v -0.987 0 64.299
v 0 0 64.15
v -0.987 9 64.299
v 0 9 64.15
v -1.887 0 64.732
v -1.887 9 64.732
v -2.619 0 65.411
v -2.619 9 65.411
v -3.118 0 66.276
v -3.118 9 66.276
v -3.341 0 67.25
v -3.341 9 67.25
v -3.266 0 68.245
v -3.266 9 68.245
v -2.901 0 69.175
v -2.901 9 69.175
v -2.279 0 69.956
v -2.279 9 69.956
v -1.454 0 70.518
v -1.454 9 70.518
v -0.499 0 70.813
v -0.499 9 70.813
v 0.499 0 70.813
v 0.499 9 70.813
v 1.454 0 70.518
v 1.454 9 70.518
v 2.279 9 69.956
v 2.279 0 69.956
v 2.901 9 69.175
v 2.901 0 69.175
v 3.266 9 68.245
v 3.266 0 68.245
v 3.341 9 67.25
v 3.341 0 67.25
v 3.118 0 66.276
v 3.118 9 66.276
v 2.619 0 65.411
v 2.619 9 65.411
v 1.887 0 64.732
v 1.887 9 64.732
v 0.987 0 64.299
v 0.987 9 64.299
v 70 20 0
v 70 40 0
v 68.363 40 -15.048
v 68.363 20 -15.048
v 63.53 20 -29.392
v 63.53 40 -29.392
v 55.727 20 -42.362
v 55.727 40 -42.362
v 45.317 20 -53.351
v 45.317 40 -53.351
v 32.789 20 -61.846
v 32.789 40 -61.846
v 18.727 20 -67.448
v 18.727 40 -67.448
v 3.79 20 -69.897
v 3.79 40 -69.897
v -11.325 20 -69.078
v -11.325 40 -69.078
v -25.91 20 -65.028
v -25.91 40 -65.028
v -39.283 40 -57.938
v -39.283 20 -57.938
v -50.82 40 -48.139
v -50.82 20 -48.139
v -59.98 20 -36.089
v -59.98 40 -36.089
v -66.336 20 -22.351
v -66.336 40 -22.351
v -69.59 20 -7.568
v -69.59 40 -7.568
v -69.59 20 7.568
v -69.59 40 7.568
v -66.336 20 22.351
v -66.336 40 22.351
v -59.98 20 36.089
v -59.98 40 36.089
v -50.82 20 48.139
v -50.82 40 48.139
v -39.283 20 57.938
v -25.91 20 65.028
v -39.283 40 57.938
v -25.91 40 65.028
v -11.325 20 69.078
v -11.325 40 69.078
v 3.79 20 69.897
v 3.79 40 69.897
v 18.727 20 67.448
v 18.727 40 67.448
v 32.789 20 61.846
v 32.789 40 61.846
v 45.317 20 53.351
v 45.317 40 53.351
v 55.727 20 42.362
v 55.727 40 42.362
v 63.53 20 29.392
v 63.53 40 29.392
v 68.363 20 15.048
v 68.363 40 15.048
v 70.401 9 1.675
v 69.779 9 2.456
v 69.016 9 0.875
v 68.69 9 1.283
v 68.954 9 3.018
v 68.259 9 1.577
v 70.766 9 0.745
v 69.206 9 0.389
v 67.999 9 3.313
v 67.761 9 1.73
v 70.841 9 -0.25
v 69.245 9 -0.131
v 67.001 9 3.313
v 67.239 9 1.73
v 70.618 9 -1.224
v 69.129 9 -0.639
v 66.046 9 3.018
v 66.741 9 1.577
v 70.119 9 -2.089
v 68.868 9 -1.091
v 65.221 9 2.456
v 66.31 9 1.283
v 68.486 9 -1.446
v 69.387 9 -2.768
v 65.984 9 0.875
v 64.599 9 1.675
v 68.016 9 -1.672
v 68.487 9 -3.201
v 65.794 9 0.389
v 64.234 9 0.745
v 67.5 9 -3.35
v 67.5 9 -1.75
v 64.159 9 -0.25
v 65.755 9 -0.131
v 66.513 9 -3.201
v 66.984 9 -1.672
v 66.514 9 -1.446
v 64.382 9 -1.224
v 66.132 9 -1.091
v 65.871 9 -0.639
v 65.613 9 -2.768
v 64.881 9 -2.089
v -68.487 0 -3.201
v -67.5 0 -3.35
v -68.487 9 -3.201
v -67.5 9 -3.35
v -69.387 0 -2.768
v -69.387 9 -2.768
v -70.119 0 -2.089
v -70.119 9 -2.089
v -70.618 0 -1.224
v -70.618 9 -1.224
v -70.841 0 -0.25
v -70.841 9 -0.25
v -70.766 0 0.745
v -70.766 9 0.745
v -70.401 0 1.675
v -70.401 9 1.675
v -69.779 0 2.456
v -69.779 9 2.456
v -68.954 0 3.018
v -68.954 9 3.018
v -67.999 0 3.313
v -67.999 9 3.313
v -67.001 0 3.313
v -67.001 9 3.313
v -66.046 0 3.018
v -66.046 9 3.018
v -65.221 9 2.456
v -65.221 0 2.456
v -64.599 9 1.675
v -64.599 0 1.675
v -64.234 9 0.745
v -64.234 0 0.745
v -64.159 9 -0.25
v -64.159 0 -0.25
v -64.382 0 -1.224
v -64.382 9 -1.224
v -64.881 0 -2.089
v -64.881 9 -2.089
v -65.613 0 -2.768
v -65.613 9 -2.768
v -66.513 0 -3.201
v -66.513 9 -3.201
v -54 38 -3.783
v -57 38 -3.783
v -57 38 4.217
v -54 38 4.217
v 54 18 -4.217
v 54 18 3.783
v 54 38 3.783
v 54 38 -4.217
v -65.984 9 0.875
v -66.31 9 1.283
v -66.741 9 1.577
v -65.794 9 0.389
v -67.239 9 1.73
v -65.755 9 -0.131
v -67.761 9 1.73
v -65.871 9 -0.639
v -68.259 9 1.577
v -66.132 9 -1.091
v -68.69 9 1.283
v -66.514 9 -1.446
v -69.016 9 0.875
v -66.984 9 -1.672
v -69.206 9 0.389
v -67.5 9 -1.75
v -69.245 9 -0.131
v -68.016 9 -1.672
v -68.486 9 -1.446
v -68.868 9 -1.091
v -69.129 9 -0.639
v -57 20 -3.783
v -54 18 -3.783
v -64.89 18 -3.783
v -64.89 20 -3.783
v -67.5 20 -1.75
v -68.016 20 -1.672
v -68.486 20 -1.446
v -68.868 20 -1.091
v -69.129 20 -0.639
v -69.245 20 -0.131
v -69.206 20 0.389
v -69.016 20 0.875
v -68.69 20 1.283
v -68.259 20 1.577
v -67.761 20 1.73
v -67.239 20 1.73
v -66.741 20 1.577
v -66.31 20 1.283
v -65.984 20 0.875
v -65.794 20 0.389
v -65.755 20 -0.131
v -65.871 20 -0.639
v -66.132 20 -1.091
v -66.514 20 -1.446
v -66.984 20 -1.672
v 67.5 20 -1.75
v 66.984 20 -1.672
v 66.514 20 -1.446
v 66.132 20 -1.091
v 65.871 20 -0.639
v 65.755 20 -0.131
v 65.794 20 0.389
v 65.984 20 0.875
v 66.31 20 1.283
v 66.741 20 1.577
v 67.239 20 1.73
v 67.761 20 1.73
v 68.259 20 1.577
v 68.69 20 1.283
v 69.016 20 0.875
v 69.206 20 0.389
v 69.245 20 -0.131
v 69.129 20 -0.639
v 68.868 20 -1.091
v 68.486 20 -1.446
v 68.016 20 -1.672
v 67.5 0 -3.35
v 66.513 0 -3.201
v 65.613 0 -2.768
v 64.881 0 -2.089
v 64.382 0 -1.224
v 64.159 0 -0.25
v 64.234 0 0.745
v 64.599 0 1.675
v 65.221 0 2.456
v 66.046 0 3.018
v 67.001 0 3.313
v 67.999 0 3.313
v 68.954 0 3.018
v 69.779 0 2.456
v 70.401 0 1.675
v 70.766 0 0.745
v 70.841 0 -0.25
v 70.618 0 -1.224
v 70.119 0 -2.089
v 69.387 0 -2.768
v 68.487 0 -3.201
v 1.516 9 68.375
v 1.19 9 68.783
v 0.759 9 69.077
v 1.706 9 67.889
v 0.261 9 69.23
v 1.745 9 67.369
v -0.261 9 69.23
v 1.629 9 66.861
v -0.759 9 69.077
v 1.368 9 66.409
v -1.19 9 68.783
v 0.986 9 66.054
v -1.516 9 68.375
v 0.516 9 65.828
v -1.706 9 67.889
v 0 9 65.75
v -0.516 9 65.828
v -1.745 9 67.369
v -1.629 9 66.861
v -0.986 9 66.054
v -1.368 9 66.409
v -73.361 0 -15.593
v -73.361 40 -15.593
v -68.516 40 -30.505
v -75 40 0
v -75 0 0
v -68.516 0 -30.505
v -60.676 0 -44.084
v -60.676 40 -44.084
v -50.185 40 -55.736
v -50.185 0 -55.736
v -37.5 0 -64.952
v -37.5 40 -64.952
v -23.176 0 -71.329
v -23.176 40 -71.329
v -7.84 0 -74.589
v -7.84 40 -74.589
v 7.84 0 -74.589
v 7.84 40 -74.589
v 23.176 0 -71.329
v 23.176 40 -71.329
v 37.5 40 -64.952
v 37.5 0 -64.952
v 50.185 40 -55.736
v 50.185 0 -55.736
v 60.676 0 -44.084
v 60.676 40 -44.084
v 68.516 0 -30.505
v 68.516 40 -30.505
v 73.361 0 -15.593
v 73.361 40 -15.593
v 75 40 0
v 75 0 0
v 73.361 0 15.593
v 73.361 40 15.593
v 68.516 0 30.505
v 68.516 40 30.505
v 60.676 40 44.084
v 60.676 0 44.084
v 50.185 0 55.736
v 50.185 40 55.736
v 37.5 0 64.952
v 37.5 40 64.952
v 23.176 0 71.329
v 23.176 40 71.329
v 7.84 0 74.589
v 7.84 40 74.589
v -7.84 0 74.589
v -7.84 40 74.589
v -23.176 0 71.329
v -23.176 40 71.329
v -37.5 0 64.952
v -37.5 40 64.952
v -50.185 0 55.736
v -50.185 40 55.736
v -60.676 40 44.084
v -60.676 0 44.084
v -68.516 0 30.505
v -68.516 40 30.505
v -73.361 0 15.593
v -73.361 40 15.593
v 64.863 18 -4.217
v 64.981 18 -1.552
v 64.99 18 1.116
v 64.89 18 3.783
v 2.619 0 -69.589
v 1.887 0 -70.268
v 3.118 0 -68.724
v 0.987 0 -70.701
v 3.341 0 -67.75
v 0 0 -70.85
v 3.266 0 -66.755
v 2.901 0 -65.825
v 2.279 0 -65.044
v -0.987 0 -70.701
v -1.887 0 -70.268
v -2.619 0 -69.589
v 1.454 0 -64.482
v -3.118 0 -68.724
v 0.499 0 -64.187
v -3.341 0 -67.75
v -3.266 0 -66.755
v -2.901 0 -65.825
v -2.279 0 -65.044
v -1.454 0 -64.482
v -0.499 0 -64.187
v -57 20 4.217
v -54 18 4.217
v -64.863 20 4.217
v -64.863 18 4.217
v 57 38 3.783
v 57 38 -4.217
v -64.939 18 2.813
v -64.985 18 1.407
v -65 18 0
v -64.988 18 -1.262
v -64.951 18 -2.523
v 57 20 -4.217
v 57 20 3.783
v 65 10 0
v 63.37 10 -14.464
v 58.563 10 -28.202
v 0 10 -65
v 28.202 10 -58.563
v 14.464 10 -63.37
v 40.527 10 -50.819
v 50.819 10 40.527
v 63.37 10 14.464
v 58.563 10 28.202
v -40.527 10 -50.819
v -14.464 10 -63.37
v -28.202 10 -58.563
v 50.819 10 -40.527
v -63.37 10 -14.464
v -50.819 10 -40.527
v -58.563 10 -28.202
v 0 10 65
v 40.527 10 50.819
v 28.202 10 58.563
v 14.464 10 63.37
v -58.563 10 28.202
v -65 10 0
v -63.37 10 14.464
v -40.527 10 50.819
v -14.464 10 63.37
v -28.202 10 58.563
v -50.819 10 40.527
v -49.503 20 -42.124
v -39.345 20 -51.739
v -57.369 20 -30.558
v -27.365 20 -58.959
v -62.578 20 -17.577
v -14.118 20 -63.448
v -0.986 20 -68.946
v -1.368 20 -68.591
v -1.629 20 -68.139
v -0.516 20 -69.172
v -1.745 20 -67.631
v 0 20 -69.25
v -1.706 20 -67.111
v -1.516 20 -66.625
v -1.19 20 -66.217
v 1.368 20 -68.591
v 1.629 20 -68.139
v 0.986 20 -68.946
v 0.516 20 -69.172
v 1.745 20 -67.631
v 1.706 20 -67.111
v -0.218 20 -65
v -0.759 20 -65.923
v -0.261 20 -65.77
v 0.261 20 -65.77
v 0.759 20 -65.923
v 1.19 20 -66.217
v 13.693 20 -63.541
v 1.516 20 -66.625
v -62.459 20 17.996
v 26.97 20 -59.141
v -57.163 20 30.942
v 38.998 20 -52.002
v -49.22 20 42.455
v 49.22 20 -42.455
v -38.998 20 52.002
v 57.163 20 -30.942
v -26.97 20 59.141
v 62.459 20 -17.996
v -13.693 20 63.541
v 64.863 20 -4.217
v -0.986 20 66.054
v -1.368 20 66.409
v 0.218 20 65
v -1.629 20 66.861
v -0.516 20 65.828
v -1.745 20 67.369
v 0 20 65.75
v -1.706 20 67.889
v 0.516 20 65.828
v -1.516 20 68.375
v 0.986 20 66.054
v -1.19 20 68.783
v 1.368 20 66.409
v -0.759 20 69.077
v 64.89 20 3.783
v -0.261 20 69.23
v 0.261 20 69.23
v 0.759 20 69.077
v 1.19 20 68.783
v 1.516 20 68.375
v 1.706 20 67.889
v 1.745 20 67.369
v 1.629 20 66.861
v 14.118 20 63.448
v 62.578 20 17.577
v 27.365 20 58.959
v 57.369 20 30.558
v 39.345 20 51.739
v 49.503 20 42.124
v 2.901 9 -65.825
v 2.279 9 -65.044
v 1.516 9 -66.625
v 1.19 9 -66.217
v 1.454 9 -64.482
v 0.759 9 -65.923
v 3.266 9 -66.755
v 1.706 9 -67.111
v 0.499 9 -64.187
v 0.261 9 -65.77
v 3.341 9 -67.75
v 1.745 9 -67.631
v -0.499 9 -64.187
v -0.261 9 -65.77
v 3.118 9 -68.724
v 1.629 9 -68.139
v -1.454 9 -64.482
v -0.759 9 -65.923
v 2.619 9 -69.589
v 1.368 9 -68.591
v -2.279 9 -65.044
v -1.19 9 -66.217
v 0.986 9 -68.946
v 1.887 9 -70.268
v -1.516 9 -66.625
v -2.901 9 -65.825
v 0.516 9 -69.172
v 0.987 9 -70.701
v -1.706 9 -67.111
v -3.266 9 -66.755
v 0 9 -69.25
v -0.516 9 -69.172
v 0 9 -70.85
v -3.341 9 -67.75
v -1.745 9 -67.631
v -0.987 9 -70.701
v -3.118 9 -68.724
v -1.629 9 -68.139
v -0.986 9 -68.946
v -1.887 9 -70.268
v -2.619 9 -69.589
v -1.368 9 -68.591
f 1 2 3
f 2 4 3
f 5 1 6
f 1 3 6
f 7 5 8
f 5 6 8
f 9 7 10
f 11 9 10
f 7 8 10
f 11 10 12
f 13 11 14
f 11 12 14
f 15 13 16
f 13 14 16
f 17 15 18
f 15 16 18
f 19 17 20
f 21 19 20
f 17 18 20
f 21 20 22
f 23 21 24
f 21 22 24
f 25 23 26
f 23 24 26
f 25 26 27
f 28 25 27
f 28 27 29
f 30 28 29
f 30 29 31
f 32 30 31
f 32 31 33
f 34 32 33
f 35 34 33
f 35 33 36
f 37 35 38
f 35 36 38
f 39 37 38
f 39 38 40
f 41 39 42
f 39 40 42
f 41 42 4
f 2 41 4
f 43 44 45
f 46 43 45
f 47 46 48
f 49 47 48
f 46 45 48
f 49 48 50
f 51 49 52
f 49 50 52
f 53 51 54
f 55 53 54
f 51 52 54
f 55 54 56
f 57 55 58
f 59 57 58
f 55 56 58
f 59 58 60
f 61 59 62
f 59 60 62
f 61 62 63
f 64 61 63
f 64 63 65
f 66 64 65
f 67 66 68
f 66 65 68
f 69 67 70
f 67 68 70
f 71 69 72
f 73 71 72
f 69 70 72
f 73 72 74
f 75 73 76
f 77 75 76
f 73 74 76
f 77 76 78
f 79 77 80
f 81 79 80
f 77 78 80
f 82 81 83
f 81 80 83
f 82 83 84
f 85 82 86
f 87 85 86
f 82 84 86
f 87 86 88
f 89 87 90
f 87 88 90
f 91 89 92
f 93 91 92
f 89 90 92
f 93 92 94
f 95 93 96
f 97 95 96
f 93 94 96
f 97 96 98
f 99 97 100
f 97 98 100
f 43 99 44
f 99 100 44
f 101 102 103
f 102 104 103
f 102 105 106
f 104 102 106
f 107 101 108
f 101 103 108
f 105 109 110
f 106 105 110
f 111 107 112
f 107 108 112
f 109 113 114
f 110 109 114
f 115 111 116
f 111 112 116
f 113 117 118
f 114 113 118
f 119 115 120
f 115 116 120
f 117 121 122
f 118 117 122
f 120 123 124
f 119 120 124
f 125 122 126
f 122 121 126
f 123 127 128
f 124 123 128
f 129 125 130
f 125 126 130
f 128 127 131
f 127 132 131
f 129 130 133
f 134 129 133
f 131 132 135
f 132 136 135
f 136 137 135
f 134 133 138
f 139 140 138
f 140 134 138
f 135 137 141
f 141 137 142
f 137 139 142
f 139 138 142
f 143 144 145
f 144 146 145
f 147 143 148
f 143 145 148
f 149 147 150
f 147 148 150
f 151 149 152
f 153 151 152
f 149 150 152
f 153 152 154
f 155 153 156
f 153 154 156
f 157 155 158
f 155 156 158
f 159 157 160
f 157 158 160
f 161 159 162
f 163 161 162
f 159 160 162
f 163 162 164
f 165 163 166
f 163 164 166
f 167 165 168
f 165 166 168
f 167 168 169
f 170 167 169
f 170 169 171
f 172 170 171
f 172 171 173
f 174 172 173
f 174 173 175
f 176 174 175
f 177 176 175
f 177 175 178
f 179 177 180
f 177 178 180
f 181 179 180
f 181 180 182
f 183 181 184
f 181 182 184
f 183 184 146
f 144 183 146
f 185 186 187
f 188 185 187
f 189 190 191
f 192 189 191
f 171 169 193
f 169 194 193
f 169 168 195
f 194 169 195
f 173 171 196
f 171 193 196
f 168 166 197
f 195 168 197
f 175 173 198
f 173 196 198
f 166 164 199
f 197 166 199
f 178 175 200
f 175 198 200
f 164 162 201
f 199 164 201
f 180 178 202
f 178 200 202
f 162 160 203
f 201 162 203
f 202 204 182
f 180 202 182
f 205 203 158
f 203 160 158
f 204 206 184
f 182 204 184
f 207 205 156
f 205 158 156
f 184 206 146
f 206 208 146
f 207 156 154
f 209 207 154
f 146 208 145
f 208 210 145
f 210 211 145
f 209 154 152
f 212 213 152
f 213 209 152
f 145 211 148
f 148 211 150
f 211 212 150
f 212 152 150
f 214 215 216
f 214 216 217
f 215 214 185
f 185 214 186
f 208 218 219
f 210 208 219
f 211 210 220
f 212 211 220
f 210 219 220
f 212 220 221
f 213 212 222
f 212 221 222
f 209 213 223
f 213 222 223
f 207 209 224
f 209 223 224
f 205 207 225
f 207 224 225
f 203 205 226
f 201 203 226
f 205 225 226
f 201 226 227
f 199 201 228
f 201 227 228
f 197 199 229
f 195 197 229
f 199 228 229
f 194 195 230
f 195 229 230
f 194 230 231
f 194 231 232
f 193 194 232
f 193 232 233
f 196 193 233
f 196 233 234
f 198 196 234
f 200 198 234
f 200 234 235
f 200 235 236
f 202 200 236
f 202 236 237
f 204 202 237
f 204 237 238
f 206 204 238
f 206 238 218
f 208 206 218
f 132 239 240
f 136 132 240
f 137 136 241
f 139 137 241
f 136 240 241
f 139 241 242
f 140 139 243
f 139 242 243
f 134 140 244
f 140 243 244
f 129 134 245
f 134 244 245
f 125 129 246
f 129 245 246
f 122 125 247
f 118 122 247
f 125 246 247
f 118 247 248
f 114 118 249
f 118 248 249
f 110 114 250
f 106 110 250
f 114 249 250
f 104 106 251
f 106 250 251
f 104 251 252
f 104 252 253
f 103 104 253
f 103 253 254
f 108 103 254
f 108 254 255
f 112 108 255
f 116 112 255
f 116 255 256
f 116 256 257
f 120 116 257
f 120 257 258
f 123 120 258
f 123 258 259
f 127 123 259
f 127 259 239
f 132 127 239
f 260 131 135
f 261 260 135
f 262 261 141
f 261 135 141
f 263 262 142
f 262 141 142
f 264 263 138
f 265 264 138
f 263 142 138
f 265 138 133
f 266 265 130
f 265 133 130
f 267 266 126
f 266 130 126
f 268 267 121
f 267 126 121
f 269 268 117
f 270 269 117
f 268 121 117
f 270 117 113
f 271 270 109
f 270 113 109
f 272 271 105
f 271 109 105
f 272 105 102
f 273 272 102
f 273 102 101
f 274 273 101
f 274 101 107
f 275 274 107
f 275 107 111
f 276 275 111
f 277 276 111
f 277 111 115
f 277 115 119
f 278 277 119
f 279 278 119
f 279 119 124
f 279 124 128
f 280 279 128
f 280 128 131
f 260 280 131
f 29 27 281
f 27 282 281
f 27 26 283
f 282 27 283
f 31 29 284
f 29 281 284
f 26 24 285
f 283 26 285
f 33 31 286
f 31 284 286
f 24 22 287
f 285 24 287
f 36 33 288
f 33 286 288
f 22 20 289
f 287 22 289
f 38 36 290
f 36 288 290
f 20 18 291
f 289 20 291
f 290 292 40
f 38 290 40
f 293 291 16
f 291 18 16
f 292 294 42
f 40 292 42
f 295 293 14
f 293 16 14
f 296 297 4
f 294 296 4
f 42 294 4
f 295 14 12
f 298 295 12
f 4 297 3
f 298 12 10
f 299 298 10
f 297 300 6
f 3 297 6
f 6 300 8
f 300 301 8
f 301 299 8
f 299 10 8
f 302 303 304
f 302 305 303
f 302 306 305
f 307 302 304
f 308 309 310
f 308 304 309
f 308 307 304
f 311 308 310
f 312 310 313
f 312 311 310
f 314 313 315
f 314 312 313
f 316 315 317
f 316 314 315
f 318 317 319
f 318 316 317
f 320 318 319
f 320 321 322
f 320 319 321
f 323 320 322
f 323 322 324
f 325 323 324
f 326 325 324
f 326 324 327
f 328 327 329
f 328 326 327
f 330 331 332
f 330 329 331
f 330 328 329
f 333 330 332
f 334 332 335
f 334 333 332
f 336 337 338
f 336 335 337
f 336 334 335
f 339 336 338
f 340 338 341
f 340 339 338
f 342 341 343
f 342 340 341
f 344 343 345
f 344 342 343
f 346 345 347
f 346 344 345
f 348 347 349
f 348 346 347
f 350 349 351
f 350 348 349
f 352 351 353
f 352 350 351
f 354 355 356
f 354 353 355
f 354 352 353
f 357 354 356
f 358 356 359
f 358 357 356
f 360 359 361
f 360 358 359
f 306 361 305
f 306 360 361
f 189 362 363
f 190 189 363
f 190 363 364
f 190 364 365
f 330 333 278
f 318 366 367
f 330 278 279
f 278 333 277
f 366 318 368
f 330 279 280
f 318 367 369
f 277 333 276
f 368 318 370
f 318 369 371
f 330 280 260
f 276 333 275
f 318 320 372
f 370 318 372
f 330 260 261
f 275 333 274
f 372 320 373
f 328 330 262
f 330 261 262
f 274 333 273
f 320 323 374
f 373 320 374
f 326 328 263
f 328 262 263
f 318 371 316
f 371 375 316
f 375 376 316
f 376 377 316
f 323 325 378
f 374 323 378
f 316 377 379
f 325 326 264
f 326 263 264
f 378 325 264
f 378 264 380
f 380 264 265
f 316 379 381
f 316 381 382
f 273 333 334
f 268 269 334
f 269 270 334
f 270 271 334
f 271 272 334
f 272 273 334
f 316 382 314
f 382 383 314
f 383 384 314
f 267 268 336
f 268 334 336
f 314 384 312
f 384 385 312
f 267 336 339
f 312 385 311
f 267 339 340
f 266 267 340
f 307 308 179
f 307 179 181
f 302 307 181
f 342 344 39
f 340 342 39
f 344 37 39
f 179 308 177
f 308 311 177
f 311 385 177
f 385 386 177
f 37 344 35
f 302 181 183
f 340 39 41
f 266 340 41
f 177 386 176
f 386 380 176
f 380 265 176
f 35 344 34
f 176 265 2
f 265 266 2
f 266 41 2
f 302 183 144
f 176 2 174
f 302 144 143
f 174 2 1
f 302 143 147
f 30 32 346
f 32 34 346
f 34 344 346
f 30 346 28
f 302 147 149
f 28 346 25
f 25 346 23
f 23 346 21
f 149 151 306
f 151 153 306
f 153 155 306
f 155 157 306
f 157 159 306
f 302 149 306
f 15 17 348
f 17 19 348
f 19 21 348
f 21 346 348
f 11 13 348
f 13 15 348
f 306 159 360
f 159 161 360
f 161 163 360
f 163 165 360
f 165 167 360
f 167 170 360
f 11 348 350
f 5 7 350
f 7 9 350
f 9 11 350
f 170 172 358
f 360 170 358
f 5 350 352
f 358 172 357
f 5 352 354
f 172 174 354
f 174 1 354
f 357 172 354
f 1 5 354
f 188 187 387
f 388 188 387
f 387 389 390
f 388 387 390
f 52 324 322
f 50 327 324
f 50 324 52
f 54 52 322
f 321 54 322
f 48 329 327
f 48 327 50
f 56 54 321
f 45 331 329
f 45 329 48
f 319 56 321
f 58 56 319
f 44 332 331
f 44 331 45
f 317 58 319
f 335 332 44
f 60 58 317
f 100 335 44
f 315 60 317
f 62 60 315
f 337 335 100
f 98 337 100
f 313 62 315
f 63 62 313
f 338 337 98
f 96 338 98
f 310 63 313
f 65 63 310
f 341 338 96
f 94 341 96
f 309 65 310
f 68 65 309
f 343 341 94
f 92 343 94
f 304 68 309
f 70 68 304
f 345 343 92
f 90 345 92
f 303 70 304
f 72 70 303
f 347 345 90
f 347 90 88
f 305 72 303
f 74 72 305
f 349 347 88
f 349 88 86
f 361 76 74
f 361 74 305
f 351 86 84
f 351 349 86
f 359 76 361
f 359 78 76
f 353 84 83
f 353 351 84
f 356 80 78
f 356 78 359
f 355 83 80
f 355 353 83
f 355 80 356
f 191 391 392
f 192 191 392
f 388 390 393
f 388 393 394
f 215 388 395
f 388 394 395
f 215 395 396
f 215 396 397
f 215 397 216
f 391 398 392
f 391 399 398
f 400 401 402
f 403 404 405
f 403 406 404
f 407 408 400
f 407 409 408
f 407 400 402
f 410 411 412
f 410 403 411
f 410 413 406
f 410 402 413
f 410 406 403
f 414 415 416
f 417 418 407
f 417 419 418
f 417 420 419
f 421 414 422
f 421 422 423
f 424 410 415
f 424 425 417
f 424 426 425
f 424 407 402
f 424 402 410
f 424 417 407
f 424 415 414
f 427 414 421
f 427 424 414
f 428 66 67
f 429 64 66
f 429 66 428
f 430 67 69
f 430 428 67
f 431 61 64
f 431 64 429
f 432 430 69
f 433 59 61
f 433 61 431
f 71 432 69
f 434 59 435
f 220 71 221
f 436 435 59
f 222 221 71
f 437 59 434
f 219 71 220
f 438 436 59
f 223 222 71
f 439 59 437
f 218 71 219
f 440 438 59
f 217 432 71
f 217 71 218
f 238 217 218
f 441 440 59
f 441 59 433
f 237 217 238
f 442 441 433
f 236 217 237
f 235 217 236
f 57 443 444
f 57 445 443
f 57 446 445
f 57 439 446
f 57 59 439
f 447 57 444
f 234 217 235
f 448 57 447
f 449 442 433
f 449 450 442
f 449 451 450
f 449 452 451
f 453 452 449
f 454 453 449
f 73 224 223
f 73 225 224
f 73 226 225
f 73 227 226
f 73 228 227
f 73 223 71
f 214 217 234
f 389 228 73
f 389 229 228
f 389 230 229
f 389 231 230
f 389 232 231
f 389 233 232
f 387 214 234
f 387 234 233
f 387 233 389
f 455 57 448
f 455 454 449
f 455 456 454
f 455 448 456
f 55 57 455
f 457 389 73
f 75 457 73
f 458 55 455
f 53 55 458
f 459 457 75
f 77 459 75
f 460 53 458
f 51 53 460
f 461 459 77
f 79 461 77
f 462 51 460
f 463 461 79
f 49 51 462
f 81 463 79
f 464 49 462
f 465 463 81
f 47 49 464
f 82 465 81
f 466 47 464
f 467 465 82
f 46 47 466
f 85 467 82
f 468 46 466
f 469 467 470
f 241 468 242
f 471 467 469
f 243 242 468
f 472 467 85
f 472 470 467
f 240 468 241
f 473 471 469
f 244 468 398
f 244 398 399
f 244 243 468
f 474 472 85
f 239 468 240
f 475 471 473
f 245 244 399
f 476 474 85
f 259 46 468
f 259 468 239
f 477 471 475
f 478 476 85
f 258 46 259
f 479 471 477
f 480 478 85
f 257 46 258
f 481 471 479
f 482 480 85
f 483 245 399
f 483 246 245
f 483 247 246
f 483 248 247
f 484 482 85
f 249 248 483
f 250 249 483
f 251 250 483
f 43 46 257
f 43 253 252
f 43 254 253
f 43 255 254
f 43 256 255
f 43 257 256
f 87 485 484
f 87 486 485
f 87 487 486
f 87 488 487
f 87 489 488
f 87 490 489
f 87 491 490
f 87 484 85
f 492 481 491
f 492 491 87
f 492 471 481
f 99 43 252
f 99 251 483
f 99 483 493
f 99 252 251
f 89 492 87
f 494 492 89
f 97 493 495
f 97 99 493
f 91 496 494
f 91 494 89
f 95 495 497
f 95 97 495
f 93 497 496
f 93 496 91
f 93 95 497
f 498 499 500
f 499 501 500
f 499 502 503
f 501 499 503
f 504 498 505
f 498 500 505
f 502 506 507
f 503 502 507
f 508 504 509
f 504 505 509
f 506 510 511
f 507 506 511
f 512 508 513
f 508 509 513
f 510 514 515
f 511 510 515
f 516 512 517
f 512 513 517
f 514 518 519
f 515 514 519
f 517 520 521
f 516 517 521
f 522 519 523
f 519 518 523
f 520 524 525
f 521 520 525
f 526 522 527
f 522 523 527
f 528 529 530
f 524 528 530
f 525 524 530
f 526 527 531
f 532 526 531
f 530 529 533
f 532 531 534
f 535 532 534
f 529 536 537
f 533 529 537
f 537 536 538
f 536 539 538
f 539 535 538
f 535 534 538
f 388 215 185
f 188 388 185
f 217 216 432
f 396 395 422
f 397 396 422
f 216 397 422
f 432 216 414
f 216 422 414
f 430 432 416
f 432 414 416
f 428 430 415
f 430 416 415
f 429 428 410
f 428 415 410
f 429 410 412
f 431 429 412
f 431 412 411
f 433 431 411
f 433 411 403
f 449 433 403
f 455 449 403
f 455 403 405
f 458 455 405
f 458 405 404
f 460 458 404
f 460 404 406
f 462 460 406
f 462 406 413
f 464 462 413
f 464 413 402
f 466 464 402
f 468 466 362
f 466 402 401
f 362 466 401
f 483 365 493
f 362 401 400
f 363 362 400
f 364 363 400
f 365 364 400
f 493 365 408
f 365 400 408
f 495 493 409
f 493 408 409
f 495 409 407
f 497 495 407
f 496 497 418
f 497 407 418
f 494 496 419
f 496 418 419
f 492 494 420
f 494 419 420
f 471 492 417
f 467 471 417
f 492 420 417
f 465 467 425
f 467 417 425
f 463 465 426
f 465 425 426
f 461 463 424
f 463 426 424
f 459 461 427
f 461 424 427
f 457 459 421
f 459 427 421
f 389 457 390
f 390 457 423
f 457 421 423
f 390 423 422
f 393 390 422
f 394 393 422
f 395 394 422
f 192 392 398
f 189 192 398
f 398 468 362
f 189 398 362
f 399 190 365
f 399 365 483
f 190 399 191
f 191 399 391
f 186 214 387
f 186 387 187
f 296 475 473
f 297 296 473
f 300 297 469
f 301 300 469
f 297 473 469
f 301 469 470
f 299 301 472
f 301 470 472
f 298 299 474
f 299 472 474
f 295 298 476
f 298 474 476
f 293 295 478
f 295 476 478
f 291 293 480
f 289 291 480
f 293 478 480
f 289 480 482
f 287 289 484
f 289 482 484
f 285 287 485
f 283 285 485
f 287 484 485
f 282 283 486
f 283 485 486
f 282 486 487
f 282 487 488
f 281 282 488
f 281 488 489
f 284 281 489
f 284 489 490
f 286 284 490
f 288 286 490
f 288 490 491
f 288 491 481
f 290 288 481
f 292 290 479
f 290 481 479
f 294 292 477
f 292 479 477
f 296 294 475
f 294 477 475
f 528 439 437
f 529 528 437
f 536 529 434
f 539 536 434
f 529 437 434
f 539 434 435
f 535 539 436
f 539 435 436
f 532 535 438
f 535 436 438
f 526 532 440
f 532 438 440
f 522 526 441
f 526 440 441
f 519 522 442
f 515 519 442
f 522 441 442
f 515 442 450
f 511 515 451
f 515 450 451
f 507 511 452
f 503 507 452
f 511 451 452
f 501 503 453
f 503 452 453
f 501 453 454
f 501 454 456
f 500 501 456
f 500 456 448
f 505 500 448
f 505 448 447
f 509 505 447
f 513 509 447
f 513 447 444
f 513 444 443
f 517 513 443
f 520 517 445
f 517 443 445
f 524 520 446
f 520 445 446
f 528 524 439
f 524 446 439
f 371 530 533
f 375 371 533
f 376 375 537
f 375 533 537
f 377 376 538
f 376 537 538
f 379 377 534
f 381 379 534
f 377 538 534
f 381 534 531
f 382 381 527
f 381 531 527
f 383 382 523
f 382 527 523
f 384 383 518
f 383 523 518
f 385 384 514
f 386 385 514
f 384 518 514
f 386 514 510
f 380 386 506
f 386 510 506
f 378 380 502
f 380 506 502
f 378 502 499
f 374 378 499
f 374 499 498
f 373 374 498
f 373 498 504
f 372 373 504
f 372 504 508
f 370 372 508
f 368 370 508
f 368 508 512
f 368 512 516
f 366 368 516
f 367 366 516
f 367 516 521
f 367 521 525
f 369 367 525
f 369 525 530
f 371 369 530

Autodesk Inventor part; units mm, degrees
ref_plane "XZ Plane" through (0, 0, 0) normal (0, 1, 0) x (-1, 0, 0)
ref_plane "XY Plane" through (0, 0, 0) normal (0, 0, 1) x (1, 0, 0)
sketch "스케치1" plane through (0, 0, 0) normal (0, 1, 0) x (-1, 0, 0)
  circle A0 centre (0, 0) radius 75
  dimension "d0" = 150
extrude "돌출1" add sketch "스케치1" along normal blind 40
shell "쉘1" thickness 10 removed faces 1 at (17.2828, 40, 11.7077)
sketch "스케치6" plane through (0, 40, 0) normal (0, 1, 0) x (1, 0, 0)
  circle A0 centre (0, 0) radius 65
  circle A1 centre (0, 0) radius 70
  dimension "d22" = 130
  dimension "d23" = 140
extrude "돌출5" cut sketch "스케치6" against normal blind 20
sketch "스케치8" plane through (0, 0, 0) normal (0, -1, 0) x (1, 0, 0)
  circle A0 centre (0, 0) radius 67.5
  point P0 (0, -67.5)
  point P1 (67.5, 0)
  point P2 (0, 67.5)
  point P3 (-67.5, 0)
  dimension "d31" = 135
hole "구멍2" at (0, 0, -67.5) at (67.5, 0, 0) at (0, 0, 67.5) at (-67.5, 0, 0) direction (0, 1, 0) diameter 3.5 depth 25 counterbore diameter 6.7 counterbore depth 9
ref_plane "작업 평면1" through (57, 0, 0) normal (1, 0, 0) x (0, 1, 0)
sketch "스케치10" plane through (57, 0, 0) normal (1, 0, 0) x (0, 1, 0)
  line L0 (38, -4.2173) -> (18, -4.2173)
  line L1 (18, -4.2173) -> (18, 3.7827)
  line L2 (18, 3.7827) -> (38, 3.7827)
  line L3 (38, 3.7827) -> (38, -4.2173)
  line L4 (38, -4.2173) -> (18, 3.7827) construction
  line L5 (18, -4.2173) -> (38, 3.7827) construction
  line L6 (10, 65) -> (10, -65) projected
  point P0 (0, 0)
  point P1 (28, -0.2173)
  dimension "d40" = 20
  dimension "d41" = 8
  dimension "d42" = 18
extrude "돌출6" add sketch "스케치10" against normal blind 3
sketch "스케치11" plane through (57, 0, 0) normal (1, 0, 0) x (0, 0, -1)
  line L0 (4.2173, 38) -> (4.2173, 18) projected
  line L1 (4.2173, 18) -> (-3.7827, 18)
  line L2 (-3.7827, 18) -> (-3.7827, 20)
  line L3 (-3.7827, 20) -> (4.2173, 20)
  line L4 (4.2173, 20) -> (4.2173, 18)
  point P0 (0, 0)
  dimension "d45" = 8
  dimension "d46" = 2
extrude "돌출7" add sketch "스케치11" along normal up to next
pattern_circular "원형 패턴1" count 2 over 360 about axis through (0, 0, 0) along (0, 1, 0) of "돌출6", "돌출7"
properties part number "바텀(하)"
